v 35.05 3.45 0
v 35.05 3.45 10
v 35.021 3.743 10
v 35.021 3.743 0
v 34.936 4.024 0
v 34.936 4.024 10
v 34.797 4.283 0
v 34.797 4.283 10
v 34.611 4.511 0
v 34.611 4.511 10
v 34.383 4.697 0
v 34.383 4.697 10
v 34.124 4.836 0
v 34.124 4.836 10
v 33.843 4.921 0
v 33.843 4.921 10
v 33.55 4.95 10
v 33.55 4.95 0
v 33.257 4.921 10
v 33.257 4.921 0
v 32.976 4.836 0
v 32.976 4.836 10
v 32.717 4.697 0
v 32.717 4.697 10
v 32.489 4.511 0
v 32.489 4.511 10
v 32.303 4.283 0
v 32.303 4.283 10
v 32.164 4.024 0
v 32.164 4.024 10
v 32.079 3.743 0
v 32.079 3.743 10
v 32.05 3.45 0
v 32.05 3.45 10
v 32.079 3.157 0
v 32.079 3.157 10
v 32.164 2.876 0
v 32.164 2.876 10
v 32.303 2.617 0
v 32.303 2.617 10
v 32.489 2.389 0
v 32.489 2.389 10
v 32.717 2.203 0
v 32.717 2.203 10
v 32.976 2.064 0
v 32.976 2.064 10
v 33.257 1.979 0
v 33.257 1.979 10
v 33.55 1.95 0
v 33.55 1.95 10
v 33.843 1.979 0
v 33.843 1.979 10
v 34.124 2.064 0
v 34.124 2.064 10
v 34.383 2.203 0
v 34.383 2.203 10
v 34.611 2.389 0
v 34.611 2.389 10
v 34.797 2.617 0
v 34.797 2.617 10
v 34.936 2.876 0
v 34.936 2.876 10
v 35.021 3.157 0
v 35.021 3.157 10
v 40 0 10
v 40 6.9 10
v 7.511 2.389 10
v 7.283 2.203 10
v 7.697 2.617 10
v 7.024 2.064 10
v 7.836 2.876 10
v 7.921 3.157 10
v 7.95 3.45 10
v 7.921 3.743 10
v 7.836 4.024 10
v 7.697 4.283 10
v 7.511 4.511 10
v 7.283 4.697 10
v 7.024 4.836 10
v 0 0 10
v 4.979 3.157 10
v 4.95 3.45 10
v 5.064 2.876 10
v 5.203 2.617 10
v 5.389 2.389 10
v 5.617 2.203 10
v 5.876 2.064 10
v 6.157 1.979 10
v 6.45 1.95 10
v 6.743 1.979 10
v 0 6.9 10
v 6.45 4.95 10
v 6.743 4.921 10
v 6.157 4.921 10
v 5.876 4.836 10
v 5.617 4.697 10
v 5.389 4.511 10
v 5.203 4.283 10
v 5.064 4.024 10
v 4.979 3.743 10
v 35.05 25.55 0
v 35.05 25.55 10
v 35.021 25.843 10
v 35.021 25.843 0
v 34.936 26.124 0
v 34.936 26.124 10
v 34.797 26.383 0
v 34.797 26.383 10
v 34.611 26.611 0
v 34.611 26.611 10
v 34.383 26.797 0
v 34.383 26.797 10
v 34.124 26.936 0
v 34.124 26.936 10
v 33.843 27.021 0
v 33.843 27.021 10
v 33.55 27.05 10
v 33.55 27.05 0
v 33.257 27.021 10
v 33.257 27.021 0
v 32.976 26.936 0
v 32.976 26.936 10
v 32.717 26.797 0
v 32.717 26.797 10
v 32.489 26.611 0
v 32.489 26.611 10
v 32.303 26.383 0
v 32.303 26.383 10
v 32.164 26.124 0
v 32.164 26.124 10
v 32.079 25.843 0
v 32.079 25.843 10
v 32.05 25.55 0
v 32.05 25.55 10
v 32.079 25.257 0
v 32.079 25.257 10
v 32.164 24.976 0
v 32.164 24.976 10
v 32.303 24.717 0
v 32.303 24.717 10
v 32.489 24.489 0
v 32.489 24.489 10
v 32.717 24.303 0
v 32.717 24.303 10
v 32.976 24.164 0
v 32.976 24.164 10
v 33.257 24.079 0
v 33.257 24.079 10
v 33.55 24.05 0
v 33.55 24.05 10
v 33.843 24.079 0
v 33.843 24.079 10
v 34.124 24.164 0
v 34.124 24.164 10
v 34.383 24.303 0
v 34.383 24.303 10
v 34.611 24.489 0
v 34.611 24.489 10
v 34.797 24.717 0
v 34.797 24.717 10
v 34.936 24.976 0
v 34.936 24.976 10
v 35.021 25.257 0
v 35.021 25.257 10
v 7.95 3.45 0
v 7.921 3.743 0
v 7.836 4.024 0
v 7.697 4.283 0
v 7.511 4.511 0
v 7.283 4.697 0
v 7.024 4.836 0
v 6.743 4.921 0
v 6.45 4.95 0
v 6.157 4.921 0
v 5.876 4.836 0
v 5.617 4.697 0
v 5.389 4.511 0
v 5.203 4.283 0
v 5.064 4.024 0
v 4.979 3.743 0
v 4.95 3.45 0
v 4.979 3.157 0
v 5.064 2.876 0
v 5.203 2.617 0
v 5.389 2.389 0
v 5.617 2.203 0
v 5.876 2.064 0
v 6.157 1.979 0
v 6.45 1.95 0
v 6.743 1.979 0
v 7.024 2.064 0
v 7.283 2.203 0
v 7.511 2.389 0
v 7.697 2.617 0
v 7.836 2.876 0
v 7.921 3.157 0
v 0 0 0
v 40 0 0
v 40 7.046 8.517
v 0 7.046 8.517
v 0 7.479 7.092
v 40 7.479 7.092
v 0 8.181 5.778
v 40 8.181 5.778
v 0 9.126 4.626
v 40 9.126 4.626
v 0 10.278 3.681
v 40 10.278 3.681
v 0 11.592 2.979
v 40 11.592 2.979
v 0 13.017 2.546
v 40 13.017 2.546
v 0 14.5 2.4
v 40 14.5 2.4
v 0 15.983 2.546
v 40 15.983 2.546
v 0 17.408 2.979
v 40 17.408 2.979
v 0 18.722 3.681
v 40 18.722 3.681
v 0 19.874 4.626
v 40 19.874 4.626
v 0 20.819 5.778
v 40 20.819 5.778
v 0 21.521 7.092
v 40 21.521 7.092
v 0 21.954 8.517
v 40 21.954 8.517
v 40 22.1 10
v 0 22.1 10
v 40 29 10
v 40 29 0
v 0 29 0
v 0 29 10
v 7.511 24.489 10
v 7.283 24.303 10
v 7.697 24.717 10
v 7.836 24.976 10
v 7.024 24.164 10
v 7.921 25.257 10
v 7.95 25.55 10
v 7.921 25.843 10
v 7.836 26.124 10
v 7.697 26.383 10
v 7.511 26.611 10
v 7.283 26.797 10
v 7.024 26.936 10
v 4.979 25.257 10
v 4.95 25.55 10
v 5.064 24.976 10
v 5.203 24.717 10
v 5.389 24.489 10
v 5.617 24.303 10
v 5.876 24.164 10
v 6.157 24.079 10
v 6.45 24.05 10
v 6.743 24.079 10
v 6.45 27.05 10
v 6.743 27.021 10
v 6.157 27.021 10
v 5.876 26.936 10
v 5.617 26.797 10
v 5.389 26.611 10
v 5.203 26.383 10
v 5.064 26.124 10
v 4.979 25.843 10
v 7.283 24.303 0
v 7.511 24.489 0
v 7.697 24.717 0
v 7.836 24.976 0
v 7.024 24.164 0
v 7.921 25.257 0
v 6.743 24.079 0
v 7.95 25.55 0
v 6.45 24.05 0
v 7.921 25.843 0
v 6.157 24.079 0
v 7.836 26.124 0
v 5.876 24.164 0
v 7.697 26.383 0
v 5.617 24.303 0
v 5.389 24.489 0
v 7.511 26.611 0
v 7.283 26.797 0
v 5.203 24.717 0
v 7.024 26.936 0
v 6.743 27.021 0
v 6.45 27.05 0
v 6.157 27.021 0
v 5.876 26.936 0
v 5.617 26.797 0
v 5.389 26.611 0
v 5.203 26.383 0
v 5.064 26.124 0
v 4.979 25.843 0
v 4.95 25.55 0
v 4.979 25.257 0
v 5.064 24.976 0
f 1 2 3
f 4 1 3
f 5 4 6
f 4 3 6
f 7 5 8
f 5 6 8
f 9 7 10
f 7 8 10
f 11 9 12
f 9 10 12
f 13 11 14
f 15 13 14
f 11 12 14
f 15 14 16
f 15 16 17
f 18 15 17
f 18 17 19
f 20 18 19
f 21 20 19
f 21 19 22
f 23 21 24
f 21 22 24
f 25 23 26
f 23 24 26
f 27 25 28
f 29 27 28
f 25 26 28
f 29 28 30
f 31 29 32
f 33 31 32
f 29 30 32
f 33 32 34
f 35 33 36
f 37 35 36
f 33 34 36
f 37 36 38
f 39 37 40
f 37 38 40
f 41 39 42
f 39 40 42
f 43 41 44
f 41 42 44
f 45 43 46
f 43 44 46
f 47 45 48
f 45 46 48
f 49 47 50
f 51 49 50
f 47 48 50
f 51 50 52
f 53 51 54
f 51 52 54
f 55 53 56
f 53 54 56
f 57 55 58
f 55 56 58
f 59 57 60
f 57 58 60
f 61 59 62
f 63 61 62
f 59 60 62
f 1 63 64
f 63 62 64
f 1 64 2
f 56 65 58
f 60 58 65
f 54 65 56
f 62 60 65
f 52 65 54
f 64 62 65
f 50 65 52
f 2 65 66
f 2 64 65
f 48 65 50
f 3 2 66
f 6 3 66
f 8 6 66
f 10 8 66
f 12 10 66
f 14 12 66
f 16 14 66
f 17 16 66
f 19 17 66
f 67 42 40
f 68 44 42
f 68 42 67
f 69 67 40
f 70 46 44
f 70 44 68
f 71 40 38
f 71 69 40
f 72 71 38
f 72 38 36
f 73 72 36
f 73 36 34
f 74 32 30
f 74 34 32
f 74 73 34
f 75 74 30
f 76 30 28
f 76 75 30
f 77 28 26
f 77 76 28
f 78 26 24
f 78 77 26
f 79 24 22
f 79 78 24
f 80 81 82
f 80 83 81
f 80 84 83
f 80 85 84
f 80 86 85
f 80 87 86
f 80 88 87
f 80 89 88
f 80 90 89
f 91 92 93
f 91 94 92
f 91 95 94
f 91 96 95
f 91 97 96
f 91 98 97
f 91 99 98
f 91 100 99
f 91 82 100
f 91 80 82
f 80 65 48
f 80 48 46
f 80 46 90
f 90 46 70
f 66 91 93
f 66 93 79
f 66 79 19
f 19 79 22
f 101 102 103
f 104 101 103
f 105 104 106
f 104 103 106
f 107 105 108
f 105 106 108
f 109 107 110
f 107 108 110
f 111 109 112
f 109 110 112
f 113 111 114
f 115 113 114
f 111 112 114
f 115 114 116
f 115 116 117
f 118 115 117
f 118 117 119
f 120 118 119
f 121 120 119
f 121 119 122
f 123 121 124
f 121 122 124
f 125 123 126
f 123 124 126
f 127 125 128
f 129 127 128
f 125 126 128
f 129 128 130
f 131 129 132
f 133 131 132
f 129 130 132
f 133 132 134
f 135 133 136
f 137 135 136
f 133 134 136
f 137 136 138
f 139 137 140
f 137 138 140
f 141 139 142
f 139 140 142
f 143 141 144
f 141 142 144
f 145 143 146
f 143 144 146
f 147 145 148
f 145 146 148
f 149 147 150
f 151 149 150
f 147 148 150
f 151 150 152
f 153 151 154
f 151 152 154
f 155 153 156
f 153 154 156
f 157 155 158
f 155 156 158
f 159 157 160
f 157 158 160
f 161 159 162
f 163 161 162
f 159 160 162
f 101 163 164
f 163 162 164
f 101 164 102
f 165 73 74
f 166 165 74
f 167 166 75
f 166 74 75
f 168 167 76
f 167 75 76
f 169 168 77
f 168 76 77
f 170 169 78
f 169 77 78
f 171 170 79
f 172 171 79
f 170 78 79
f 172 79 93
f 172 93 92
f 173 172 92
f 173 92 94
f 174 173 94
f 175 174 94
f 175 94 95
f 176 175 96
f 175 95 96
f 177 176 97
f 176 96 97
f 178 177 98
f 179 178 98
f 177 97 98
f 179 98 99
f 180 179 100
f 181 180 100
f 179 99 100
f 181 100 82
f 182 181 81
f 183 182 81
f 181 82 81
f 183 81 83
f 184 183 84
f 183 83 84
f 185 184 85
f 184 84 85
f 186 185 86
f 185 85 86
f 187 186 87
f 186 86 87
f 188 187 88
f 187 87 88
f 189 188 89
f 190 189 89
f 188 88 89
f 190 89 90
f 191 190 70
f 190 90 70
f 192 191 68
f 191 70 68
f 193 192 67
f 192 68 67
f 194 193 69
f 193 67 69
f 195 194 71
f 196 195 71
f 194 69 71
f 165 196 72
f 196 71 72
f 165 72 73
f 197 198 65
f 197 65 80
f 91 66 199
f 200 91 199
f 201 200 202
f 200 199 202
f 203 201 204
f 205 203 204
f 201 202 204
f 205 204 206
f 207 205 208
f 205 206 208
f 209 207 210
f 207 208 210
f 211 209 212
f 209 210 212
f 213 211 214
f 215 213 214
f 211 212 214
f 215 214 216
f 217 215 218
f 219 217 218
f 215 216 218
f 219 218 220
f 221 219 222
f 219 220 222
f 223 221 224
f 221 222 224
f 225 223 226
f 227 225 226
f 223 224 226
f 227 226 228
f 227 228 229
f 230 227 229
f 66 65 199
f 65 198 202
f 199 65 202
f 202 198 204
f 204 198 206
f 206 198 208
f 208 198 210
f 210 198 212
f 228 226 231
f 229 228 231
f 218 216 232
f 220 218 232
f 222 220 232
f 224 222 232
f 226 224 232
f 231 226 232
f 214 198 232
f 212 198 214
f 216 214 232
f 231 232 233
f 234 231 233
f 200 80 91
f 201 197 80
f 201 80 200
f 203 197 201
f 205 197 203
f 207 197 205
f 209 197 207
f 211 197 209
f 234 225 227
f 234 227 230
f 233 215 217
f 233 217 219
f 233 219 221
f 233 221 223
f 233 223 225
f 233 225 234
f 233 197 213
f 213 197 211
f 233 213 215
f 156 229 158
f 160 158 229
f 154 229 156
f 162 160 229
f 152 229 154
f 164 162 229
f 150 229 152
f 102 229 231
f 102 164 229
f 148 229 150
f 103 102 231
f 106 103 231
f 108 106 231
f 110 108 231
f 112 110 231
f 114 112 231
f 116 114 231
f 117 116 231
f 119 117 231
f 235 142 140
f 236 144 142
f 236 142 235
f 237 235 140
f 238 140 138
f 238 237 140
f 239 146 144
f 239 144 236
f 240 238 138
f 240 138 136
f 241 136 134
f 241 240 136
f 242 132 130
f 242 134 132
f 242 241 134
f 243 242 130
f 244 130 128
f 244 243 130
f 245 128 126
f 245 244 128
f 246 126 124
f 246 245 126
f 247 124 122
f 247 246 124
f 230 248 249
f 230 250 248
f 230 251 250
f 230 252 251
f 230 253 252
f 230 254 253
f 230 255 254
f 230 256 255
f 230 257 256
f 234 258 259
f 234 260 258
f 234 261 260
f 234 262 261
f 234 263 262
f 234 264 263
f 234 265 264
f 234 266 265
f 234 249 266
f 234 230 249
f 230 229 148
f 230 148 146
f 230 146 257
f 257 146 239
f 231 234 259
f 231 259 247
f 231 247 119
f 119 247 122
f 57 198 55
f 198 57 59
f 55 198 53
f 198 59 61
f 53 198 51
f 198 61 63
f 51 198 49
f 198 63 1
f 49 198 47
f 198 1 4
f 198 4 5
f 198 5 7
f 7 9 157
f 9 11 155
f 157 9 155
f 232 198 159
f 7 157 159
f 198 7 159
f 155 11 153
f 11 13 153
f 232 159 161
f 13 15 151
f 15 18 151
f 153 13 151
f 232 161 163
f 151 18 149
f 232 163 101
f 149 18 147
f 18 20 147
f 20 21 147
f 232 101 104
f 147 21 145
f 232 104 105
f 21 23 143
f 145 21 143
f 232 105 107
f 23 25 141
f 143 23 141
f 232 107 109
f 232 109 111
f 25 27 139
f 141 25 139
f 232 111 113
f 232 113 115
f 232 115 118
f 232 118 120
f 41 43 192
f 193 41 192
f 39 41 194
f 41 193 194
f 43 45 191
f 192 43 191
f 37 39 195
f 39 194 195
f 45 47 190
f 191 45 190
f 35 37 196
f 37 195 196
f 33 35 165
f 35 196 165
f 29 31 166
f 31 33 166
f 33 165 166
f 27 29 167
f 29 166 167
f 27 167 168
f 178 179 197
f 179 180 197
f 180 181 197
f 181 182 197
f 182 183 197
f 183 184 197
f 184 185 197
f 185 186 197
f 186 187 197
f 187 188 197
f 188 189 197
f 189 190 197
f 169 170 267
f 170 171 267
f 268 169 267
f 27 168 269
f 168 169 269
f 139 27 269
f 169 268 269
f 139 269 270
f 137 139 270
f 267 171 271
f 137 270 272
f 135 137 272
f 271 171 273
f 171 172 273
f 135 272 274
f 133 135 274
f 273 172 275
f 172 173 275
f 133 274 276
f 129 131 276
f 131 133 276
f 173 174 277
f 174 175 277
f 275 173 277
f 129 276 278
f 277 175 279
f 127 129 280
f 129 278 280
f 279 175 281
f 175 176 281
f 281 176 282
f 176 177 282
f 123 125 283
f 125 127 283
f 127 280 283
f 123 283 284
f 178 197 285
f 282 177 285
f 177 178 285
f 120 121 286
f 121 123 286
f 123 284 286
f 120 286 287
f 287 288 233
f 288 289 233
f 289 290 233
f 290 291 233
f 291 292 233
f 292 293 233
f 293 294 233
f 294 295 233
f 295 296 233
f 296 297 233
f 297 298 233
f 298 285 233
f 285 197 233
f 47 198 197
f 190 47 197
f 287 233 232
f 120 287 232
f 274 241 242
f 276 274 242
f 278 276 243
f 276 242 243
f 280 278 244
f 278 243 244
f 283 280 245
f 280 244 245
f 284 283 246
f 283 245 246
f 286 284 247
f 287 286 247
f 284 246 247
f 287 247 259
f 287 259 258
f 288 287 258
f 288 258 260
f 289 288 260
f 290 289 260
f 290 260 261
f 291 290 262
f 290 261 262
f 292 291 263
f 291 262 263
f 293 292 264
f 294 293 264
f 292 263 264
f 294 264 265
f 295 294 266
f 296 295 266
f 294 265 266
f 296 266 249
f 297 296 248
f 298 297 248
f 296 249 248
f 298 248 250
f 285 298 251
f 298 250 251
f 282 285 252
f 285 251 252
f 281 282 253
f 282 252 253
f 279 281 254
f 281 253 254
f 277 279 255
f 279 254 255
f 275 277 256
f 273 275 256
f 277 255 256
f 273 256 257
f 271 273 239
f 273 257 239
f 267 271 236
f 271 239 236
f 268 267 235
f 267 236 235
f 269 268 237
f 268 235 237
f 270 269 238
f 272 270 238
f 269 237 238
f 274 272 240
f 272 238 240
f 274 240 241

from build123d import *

# Parameters (mm, degrees)
SKETCH1_W           = 29
SKETCH1_H           = 40
BOSS_EXTRUDE1_DEPTH = 10
SKETCH2_R           = 7.6
CUT_EXTRUDE1_DEPTH  = 40
SKETCH3_R           = 1.5
CUT_EXTRUDE2_DEPTH  = 10


with BuildPart() as part:
    # Sketch1 → Boss-Extrude1 (new body)
    with BuildSketch(Plane(origin=(0, 0, 0), x_dir=(0, 1, 0), z_dir=(0, 0, 1))):
        with Locations((14.5, -20)):
            Rectangle(SKETCH1_W, SKETCH1_H)
    extrude(amount=BOSS_EXTRUDE1_DEPTH)

    # Sketch2 → Cut-Extrude1 (cut)
    with BuildSketch(Plane.YZ.offset(40)):
        with Locations((14.5, 10)):
            Circle(SKETCH2_R)
    extrude(amount=-CUT_EXTRUDE1_DEPTH, mode=Mode.SUBTRACT)

    # Sketch3 → Cut-Extrude2 (cut)
    with BuildSketch(Plane.XY.offset(10)):
        with Locations((6.45, 25.55)):
            Circle(SKETCH3_R)
        with Locations((33.55, 25.55)):
            Circle(SKETCH3_R)
        with Locations((33.55, 3.45)):
            Circle(SKETCH3_R)
        with Locations((6.45, 3.45)):
            Circle(SKETCH3_R)
    extrude(amount=-CUT_EXTRUDE2_DEPTH, mode=Mode.SUBTRACT)


solid = part.part
